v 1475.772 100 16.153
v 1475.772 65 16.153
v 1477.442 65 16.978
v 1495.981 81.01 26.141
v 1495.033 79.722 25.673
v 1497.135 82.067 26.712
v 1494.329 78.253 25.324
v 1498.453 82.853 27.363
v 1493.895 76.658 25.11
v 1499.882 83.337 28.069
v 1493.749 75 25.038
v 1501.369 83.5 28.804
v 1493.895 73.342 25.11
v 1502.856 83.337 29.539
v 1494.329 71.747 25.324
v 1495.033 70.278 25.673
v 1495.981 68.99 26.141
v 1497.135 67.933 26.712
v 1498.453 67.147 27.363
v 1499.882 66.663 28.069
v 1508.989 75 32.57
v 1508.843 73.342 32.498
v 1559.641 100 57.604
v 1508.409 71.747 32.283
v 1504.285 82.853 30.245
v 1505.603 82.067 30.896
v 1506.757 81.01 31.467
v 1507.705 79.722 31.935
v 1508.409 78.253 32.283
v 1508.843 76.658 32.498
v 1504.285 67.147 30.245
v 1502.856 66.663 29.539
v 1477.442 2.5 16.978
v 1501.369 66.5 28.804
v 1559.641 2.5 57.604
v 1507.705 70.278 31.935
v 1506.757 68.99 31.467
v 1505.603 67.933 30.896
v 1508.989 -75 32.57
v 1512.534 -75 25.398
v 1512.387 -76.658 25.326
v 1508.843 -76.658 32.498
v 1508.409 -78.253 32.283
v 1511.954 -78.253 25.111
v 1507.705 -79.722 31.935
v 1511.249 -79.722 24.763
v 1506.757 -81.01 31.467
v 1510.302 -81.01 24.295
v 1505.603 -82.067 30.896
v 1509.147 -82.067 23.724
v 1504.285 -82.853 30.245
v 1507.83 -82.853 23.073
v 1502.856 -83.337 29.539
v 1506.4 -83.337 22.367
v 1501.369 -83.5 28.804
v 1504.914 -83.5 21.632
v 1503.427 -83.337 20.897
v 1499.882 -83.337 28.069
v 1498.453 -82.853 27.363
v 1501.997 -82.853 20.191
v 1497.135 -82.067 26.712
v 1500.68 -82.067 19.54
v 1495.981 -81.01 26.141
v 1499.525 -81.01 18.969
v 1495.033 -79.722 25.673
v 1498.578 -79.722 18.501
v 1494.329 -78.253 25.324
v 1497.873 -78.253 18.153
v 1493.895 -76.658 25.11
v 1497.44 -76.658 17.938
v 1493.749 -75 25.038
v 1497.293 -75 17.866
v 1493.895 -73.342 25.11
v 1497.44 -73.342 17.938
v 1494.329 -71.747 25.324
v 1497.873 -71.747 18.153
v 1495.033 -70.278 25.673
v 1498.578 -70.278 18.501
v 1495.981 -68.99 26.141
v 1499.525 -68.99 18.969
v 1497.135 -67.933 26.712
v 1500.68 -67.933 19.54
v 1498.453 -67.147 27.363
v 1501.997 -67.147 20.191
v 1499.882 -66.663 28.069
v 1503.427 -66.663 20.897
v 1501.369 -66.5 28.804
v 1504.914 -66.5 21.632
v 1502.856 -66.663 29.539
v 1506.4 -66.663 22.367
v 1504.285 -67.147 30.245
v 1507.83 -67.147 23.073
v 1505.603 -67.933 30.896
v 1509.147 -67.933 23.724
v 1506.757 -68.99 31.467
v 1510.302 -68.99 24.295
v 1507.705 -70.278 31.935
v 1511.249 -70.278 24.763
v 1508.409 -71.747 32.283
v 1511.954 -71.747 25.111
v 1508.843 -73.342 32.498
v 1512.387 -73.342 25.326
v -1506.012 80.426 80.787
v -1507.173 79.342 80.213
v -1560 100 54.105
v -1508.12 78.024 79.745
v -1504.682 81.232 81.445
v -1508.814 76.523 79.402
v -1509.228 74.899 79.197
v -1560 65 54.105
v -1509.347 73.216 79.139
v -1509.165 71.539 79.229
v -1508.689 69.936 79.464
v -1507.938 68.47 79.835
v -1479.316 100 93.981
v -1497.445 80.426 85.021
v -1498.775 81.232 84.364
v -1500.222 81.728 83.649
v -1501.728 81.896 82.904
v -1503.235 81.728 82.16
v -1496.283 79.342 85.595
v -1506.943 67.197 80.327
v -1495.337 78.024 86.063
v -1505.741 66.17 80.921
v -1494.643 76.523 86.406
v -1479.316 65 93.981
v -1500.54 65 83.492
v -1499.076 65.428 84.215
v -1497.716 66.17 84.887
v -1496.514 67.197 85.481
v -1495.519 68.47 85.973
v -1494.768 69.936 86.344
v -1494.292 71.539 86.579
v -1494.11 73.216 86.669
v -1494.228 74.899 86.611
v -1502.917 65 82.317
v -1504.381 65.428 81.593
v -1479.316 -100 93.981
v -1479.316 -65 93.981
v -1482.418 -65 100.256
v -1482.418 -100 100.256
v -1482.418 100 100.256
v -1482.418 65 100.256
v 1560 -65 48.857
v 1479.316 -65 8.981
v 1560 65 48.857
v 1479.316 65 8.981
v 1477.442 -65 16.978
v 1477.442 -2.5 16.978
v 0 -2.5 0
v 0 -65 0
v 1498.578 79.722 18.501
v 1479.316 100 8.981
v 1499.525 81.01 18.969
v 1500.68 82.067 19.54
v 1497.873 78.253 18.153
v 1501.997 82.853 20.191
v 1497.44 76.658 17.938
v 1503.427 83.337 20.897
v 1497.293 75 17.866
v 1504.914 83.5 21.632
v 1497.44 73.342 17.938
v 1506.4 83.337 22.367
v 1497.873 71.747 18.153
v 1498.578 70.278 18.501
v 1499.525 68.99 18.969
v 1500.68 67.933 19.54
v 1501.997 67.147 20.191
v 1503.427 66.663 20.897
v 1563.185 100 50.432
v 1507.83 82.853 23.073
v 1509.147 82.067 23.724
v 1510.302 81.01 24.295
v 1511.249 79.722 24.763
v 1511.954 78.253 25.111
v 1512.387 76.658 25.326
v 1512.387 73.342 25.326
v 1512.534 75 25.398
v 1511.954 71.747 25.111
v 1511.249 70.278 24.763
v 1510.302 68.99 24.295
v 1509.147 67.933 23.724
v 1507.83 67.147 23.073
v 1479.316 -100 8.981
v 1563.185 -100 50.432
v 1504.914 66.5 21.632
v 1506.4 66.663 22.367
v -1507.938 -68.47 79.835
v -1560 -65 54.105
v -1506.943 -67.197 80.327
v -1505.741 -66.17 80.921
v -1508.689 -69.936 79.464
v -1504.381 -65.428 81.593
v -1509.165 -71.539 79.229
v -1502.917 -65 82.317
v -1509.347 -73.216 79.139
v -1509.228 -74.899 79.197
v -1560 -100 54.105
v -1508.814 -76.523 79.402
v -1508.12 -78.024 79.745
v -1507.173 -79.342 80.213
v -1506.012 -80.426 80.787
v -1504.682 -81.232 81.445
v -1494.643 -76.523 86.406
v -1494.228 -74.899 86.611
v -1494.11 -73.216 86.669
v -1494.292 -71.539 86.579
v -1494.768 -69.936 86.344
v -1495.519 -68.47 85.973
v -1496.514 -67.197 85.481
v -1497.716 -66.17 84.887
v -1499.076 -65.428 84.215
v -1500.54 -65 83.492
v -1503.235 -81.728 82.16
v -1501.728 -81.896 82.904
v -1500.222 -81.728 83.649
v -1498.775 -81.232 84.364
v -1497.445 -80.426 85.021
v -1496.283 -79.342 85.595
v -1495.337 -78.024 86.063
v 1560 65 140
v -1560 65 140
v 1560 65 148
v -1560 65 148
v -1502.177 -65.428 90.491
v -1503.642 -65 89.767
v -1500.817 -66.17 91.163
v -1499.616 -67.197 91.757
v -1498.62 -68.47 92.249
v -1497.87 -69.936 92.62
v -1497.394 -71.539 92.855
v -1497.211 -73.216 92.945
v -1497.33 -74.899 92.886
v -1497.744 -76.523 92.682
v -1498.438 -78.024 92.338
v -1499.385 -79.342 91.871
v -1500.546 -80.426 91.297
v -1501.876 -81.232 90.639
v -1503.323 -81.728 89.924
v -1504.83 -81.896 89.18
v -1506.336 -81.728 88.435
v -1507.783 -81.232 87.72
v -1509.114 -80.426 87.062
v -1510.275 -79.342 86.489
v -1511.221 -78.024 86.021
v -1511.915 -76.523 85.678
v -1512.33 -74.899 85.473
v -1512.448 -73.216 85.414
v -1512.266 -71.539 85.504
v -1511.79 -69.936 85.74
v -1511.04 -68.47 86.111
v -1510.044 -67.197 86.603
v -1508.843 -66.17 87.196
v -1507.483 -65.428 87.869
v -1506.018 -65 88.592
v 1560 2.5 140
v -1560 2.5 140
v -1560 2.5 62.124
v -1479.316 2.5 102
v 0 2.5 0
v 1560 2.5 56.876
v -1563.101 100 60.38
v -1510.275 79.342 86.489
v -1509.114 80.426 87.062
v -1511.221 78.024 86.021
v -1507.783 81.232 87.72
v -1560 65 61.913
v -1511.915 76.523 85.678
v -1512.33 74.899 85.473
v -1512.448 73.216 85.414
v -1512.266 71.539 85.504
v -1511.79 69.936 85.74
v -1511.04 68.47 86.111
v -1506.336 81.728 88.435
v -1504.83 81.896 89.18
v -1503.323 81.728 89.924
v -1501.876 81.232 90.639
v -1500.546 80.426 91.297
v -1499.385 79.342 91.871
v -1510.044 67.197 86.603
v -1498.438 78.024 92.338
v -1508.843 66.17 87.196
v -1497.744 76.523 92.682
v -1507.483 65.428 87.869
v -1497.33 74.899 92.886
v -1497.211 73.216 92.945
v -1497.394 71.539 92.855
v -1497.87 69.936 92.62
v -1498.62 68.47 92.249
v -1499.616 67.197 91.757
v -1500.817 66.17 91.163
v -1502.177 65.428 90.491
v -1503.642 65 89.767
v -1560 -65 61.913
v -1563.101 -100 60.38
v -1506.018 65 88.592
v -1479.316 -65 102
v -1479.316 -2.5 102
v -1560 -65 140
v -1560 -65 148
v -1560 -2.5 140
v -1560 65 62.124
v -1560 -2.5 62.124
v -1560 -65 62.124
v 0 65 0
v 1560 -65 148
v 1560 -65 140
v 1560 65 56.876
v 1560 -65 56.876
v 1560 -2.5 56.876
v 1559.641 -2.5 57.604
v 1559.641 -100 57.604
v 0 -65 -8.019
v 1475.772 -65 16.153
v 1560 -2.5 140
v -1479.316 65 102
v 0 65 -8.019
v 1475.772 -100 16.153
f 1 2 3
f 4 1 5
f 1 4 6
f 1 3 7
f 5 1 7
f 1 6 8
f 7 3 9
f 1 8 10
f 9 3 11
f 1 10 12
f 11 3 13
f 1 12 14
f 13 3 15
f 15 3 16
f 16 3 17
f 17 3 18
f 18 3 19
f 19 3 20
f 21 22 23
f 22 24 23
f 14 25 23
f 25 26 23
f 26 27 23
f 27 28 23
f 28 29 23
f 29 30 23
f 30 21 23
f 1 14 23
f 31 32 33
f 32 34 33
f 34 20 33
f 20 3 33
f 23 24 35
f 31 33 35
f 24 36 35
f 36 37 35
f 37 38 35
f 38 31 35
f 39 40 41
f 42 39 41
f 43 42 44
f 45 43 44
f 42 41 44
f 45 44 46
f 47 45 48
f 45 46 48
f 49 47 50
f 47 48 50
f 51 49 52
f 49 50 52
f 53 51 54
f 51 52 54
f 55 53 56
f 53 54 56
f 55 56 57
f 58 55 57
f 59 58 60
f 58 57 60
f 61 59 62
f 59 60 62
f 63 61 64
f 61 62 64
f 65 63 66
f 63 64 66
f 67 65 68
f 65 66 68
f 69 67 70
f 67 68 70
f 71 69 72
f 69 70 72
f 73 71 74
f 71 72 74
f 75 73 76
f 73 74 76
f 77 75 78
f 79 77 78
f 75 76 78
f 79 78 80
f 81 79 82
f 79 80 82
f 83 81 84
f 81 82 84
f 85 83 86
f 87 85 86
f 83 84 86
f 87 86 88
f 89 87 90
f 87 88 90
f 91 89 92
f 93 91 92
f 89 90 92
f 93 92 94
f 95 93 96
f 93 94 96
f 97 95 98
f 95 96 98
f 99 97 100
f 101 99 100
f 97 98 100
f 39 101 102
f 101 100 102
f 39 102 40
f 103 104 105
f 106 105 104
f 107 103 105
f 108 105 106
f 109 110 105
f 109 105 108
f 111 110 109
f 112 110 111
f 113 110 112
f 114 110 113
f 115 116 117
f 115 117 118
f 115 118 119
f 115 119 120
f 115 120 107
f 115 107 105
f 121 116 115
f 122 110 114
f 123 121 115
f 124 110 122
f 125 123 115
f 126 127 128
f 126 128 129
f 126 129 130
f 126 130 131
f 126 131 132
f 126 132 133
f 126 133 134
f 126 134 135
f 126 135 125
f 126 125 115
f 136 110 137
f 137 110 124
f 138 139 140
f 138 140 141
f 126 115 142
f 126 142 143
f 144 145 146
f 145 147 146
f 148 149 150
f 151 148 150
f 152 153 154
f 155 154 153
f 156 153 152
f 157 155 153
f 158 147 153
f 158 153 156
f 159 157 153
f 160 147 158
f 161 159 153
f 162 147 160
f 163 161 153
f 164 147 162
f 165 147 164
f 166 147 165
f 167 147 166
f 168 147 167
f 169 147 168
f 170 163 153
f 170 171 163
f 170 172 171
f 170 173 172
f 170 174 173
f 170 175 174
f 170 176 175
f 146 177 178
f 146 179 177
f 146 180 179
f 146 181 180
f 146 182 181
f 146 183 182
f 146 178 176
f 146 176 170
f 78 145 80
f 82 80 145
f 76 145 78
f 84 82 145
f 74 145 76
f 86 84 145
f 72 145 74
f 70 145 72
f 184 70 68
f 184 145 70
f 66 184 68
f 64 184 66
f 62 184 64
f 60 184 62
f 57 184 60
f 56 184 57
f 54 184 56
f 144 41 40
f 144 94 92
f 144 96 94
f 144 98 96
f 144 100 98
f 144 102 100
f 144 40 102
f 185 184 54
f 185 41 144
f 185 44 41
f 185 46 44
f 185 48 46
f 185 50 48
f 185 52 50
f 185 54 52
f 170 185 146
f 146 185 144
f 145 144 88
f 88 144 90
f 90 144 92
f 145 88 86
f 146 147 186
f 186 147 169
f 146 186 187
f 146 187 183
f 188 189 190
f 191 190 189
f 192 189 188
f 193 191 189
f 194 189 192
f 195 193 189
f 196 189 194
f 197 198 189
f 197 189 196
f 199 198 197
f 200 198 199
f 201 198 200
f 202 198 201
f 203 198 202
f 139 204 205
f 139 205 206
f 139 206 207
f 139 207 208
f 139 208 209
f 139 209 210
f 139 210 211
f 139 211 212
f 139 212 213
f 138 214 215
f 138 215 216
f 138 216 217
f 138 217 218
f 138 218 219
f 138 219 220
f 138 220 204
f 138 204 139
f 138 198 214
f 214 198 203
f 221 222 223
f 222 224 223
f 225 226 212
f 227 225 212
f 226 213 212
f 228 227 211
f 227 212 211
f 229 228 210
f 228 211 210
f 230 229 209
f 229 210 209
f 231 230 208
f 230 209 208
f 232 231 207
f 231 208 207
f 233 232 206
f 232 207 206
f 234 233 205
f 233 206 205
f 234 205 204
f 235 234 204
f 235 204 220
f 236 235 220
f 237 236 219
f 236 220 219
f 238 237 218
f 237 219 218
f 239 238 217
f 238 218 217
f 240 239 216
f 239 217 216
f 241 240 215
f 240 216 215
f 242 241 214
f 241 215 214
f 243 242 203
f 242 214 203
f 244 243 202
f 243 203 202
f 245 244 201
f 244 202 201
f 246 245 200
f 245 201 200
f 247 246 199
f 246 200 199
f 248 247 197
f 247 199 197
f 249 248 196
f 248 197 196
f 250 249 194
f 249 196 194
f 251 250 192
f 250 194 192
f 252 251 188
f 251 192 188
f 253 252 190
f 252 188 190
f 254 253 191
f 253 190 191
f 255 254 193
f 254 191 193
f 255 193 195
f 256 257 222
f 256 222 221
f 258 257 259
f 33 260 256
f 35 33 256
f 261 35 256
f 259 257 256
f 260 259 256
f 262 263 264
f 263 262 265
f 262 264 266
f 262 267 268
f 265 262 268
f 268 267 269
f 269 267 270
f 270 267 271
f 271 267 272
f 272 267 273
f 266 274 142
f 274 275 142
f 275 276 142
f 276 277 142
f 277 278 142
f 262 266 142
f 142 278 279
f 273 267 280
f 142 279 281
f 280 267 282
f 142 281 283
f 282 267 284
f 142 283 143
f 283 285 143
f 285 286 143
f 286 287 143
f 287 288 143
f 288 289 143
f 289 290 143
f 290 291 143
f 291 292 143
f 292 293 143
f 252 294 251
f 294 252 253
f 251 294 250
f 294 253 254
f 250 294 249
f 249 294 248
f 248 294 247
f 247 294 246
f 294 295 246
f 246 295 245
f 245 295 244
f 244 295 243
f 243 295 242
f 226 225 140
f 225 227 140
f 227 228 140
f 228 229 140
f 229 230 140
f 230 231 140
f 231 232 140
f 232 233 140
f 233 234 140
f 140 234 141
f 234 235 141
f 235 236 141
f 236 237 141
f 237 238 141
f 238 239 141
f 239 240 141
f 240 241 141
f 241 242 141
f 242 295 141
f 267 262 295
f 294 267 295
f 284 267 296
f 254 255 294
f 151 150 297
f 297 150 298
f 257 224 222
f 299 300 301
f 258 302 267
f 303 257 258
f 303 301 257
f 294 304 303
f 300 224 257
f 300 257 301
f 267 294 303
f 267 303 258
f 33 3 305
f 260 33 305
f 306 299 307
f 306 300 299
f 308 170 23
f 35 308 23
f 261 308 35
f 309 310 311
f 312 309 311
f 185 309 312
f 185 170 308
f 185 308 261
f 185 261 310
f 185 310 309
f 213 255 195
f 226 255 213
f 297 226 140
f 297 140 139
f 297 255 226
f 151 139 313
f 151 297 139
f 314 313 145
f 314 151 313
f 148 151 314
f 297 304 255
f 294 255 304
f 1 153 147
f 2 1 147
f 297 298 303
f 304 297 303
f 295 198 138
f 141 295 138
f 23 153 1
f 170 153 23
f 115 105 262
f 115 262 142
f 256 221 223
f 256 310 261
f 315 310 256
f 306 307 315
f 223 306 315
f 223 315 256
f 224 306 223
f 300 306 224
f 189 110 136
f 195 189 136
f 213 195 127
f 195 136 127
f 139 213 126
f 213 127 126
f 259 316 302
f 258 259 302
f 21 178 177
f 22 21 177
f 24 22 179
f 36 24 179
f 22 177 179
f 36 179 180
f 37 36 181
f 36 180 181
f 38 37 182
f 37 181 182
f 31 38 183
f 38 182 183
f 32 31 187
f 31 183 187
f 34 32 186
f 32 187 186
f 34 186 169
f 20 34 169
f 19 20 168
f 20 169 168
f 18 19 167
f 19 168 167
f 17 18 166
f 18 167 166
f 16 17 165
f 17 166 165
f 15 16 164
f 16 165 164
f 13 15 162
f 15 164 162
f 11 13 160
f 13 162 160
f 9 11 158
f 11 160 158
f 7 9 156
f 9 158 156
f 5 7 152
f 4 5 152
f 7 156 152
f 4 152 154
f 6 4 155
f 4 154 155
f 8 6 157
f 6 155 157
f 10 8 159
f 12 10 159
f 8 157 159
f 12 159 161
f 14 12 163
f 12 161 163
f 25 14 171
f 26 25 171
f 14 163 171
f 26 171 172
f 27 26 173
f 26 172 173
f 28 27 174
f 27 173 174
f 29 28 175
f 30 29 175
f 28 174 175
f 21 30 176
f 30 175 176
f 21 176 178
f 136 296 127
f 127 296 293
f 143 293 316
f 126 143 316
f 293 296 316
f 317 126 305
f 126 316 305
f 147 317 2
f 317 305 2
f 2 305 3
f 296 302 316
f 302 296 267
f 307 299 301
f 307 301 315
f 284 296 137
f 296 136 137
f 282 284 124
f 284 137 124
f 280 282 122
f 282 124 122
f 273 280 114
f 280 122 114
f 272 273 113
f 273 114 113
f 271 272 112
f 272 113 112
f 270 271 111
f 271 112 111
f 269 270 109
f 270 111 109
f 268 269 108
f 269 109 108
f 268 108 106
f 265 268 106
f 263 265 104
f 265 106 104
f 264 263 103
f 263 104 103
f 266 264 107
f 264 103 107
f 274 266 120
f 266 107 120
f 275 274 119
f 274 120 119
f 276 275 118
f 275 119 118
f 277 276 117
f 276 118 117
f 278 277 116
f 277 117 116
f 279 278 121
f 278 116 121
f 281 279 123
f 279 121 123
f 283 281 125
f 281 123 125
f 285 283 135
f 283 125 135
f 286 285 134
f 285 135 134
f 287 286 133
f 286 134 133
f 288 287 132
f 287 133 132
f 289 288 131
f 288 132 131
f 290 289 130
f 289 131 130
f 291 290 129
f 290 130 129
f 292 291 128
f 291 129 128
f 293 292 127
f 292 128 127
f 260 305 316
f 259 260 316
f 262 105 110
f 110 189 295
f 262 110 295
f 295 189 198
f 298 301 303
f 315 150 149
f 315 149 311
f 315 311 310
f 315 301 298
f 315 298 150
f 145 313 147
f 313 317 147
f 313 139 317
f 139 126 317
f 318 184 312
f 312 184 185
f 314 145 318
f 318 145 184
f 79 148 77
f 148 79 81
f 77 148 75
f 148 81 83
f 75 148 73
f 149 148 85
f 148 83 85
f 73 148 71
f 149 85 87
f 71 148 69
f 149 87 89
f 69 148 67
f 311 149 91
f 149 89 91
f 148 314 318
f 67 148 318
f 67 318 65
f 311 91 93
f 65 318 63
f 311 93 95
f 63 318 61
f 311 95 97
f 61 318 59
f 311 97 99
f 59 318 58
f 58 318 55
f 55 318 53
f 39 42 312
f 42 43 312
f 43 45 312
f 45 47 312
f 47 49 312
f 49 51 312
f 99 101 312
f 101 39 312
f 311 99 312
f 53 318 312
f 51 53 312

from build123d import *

# Parameters (mm, degrees)
F1_DEPTH = 2.5
F3_DEPTH = 65
F5_W     = 93.5529853487
F5_H     = 200
F5_R     = 8.5
F6_DEPTH = 8
F7_W     = 90
F7_H     = 200
F7_R     = 8.5
F8_DEPTH = 7


with BuildPart() as f1:
    # F0 (on Front) → F1 (new body, symmetric)
    with BuildSketch(Plane.XZ):
        Polygon((1560, 140), (0, 140), (-1560, 140), (-1560, 62.1235928258), (-1479.3162212655, 102), (0, 0), (1479.3162212655, 17), (1560, 56.8764071742), align=None)
    extrude(amount=F1_DEPTH, both=True)

    # F2 (on Front) → F3 (join, symmetric)
    with BuildSketch(Plane.XZ):
        Polygon((1479.3162212655, 17), (0, 0), (-1479.3162212655, 102), (-1560, 62.1235928258), (-1560, 54.1045985372), (-1479.3162212655, 93.9810057114), (0, -8.0189942886), (1479.3162212655, 8.9810057114), (1560, 48.8574128856), (1560, 56.8764071742), align=None)
        Polygon((-1560, 140), (0, 140), (1560, 140), (1560, 148), (0, 148), (-1560, 148), align=None)
    extrude(amount=F3_DEPTH, both=True)

    # F5 (on face) → F6 (join)
    with BuildSketch(Plane(origin=(286.8403234569, 0, -580.3772914858), x_dir=(0.8964864304, 0, 0.4430711908), z_dir=(0.4430711908, 0, -0.8964864304))):
        with Locations((1376.9426361803, 0)):
            Rectangle(F5_W, F5_H)
        with Locations((1358.7191288546, -75)):
            Circle(F5_R, mode=Mode.SUBTRACT)
        with Locations((1358.7191288546, 75)):
            Circle(F5_R, mode=Mode.SUBTRACT)
    extrude(amount=-F6_DEPTH)

    # F7 (on face) → F8 (join)
    with BuildSketch(Plane(origin=(-327.7375870739, 0, 663.126616271), x_dir=(0.8964864304, 0, 0.4430711908), z_dir=(0.4430711908, 0, -0.8964864304))):
        with Locations((-1329.5466424952, 0)):
            Rectangle(F7_W, F7_H)
        with Locations((-1309.5466424952, -73.3960138768)):
            Circle(F7_R, mode=Mode.SUBTRACT)
        with Locations((-1309.5466424952, 73.3960138768)):
            Circle(F7_R, mode=Mode.SUBTRACT)
    extrude(amount=-F8_DEPTH)


solid = f1.part
